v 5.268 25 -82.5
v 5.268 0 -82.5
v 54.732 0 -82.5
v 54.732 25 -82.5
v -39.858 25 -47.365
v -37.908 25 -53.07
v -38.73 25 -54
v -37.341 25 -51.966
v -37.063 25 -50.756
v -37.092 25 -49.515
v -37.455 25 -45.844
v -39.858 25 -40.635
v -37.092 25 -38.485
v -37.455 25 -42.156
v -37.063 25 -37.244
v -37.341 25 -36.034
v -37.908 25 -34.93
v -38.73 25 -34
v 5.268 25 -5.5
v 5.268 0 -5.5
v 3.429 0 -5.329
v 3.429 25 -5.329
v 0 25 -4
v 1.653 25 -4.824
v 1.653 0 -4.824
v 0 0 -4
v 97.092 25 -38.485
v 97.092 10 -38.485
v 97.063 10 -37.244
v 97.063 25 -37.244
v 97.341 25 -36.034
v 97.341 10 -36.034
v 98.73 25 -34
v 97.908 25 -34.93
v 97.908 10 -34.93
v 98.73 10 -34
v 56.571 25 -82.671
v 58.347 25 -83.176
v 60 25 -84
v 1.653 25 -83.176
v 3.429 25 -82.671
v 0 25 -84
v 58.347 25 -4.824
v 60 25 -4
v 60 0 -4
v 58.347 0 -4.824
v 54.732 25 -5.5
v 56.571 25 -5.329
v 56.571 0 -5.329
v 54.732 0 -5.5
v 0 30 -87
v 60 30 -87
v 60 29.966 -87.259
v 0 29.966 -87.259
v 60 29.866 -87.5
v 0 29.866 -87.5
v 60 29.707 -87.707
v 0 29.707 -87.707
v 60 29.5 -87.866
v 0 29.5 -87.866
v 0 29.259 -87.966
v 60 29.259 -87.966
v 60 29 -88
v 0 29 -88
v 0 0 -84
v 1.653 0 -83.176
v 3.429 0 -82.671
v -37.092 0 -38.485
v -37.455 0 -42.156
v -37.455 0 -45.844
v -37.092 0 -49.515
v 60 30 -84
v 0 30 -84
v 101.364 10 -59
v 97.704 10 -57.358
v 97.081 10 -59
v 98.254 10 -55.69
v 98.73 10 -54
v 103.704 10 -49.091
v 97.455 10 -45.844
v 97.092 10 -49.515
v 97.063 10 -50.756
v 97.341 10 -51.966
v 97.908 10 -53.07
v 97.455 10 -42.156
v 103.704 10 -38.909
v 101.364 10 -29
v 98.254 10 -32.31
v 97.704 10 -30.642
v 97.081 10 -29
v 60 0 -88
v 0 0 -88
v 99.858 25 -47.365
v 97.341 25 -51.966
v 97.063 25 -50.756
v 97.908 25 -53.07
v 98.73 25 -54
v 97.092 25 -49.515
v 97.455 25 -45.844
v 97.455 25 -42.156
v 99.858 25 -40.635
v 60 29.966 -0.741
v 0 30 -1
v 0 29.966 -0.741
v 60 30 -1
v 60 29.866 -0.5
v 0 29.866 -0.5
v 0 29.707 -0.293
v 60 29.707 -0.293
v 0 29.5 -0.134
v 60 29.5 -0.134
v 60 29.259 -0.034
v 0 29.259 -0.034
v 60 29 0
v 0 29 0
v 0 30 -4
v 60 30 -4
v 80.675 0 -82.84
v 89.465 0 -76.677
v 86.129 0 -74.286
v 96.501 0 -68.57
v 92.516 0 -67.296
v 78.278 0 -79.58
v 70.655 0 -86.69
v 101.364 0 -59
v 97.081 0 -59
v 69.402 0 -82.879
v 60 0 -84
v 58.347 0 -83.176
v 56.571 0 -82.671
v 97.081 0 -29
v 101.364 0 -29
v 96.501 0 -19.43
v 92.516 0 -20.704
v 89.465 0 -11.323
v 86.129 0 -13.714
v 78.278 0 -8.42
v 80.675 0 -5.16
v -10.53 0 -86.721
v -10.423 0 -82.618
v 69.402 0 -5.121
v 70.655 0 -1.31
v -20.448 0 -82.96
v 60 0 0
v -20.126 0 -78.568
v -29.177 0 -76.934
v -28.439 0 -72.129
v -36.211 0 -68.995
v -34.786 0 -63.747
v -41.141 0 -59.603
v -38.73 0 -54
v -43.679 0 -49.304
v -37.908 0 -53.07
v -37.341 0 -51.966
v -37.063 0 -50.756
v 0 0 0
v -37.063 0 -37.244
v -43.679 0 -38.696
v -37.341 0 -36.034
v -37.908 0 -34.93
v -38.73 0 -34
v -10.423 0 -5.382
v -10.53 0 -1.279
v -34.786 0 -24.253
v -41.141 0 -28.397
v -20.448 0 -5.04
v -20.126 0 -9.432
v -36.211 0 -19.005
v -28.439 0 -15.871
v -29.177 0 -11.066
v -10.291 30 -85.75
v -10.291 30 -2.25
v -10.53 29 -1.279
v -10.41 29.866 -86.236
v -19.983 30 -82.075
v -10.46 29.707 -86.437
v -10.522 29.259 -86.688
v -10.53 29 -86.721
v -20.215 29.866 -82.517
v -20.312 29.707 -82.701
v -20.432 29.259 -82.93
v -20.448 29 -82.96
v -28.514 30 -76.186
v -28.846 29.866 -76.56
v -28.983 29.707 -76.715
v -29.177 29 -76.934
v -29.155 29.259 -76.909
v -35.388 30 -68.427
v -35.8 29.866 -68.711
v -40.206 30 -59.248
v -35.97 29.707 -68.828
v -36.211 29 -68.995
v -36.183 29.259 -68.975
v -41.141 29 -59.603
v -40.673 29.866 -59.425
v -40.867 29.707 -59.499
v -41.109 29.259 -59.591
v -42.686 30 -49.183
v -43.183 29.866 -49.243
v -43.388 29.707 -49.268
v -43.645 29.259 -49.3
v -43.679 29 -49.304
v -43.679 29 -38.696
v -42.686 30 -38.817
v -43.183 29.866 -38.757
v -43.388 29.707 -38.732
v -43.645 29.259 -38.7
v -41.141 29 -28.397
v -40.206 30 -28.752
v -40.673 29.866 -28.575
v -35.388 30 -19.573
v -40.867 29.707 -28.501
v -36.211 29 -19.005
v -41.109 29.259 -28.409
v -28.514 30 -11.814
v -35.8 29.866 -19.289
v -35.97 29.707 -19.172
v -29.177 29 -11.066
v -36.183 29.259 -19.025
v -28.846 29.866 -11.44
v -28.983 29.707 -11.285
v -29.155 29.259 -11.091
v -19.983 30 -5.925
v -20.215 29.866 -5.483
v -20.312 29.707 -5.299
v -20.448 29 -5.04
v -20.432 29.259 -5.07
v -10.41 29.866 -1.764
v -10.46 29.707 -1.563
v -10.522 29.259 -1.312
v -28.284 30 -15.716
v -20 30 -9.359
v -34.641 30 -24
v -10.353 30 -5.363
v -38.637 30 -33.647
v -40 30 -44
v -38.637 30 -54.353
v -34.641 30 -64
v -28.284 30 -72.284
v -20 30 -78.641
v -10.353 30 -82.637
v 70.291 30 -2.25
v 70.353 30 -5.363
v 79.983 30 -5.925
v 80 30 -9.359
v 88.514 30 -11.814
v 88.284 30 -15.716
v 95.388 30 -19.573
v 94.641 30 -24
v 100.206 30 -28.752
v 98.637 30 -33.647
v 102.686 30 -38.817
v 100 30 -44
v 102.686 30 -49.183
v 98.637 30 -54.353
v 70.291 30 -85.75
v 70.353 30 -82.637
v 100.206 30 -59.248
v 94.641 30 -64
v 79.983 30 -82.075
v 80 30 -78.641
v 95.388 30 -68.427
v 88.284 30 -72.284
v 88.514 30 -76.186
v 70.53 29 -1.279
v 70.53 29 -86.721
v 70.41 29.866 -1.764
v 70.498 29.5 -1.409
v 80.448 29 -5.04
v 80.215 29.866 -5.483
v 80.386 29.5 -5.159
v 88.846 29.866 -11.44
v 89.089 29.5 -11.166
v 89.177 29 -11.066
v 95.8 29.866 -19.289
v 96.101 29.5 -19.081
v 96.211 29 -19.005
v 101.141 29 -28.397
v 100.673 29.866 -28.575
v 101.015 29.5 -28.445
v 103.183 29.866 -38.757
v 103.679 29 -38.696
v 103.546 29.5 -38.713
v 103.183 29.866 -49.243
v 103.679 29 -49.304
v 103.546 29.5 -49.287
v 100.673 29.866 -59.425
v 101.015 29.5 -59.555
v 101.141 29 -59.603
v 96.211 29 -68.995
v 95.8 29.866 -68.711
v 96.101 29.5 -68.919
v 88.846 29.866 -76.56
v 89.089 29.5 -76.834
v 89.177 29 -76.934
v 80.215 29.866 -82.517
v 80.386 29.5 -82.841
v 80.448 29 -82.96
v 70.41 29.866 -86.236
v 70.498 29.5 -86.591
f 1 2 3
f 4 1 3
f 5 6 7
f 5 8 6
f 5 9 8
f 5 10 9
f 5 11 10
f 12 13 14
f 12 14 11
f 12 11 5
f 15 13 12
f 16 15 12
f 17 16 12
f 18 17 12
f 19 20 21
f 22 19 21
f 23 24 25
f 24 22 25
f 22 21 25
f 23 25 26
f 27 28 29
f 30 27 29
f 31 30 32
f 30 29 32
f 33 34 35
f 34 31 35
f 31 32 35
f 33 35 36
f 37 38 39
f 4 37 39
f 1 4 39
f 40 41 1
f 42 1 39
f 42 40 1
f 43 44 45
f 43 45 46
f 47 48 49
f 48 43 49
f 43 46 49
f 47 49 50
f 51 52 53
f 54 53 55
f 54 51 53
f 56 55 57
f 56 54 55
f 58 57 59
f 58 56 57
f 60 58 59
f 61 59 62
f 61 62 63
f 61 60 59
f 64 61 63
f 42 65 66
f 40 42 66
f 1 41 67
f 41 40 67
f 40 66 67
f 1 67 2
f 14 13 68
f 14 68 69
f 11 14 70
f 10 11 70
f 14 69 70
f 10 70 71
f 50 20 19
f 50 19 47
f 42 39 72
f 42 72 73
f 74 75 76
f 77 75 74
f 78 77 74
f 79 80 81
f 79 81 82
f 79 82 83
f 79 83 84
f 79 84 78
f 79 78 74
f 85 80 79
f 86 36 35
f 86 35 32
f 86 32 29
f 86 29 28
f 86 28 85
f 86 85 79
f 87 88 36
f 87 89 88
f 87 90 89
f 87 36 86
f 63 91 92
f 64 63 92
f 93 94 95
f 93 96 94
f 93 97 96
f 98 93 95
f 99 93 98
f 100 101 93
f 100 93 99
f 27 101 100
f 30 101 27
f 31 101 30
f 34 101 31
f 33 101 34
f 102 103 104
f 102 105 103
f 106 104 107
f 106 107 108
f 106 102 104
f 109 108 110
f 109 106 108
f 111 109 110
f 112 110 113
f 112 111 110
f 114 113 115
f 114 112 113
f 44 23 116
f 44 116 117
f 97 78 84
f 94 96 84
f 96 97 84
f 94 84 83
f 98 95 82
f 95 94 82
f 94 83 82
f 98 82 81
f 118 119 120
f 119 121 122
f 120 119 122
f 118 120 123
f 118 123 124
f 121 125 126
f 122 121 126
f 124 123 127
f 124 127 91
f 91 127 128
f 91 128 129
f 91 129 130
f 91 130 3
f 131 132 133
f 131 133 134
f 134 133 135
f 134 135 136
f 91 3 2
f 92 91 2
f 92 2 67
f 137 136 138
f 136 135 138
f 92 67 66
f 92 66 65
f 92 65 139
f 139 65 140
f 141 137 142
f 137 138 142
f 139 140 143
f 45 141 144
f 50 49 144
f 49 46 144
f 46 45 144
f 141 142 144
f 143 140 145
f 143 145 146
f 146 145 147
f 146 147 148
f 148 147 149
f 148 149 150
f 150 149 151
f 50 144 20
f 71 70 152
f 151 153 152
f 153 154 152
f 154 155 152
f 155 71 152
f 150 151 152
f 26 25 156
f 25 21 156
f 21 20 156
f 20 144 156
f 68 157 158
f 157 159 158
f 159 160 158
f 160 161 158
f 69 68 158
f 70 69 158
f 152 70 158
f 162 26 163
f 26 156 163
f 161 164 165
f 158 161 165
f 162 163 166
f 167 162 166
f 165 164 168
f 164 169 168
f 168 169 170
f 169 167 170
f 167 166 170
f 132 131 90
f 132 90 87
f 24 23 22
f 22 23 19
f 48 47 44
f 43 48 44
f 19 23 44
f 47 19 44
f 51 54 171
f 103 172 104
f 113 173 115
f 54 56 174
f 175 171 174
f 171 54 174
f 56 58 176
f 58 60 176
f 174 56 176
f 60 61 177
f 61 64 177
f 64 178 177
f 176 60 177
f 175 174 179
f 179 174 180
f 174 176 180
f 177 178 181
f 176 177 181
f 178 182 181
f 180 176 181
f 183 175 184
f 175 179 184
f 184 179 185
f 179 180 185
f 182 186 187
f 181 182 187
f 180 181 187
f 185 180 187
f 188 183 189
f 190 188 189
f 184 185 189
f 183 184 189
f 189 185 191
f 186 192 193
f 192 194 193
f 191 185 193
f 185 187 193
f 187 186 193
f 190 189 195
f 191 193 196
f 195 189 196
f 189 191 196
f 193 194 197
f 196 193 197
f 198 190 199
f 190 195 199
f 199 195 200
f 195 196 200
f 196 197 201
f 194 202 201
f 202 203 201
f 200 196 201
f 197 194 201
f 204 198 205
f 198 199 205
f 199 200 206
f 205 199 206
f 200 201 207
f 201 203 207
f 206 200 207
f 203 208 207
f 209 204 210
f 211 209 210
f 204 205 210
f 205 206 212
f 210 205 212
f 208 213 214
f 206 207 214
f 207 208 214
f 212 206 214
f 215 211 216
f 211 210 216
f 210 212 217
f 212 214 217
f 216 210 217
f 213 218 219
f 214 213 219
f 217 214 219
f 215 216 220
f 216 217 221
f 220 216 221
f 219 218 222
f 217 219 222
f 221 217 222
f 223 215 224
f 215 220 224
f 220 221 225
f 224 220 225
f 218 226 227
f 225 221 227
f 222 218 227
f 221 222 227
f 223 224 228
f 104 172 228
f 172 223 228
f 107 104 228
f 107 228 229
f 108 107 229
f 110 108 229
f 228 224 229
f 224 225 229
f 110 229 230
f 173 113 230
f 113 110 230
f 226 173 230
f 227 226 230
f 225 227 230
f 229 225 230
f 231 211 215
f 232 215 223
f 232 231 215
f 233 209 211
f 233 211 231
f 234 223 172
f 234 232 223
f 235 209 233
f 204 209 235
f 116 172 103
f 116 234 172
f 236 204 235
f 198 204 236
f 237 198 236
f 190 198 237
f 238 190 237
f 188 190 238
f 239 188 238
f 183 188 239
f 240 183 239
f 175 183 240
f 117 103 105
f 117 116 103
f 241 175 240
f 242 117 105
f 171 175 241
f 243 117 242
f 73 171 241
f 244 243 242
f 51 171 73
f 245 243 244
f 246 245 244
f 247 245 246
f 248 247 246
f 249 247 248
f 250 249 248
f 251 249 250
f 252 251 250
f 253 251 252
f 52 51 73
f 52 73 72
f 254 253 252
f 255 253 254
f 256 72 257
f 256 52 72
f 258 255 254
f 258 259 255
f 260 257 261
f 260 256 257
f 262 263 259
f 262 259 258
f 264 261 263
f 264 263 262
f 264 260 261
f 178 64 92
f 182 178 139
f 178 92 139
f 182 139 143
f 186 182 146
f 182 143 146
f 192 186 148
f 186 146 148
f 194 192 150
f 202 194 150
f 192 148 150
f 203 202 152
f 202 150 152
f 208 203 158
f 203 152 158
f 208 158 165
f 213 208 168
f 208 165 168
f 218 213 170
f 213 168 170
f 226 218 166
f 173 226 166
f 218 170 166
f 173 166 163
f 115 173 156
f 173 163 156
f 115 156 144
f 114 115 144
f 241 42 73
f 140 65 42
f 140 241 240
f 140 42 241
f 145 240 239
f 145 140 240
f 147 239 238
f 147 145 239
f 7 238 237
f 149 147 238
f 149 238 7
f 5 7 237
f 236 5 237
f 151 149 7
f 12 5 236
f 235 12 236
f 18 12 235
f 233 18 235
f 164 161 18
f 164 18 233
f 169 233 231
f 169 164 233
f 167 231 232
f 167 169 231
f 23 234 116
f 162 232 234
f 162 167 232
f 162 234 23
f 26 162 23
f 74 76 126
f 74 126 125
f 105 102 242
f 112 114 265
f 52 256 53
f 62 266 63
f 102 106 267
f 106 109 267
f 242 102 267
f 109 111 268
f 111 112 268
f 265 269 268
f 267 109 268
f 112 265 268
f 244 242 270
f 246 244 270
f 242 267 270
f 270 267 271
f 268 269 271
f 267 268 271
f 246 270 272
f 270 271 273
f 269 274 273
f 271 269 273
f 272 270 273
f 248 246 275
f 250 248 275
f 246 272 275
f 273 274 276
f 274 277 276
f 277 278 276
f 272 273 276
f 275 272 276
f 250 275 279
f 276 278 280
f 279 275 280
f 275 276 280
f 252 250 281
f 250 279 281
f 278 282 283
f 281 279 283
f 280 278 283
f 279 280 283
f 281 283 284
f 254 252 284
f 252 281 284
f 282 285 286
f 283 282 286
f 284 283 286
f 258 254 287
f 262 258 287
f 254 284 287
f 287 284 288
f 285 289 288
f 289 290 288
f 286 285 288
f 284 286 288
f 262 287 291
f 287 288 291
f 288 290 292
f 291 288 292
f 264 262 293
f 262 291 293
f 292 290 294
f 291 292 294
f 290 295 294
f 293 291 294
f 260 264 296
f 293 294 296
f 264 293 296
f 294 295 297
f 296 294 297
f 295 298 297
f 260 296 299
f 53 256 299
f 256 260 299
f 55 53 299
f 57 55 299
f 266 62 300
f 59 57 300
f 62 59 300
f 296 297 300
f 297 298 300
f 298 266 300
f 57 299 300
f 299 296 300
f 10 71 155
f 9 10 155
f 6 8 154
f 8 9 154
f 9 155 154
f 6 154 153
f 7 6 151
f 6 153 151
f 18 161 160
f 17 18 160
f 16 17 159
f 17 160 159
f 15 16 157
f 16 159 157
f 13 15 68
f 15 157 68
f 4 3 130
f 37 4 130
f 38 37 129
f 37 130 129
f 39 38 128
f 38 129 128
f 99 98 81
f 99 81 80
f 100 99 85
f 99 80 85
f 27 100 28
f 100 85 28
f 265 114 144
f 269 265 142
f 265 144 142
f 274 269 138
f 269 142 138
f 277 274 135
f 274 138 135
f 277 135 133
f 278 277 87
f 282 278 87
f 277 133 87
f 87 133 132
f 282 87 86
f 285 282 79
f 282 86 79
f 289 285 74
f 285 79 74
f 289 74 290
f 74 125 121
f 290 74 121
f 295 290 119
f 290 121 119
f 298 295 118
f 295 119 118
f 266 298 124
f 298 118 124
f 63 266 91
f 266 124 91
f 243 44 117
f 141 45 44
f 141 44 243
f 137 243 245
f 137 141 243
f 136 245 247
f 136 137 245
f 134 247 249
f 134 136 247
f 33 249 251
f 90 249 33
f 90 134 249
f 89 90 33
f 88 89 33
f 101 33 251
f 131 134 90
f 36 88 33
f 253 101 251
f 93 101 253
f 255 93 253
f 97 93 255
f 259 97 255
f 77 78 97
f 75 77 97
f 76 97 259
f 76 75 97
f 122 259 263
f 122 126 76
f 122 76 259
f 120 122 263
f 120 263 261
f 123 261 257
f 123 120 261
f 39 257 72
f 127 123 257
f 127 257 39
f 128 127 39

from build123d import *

# Parameters (mm, degrees)
BOSS_EXTRUDE1_DEPTH = 30
SHELL1_T            = -4
SKETCH3_W           = 60
SKETCH3_H           = 1.5
BOSS_EXTRUDE2_DEPTH = 25
BOSS_EXTRUDE3_DEPTH = 25
FILLET2_R           = 10
BOSS_EXTRUDE5_DEPTH = 25
FILLET5_R           = 5
FILLET6_R           = 1
SKETCH9_W           = 17
SKETCH9_H           = 30
CUT_EXTRUDE1_DEPTH  = 10


with BuildPart() as part:
    # Sketch1 → Boss-Extrude1 (new body)
    with BuildSketch(Plane(origin=(0, 0, 0), x_dir=(1, 0, 0), z_dir=(0, 1, 0))):
        with BuildLine():
            Line((0, 0), (60, 0))
            ThreePointArc((60, 0), (104, 44), (60, 88))
            Line((60, 88), (0, 88))
            ThreePointArc((0, 88), (-44, 44), (0, 0))
        make_face()
    extrude(amount=BOSS_EXTRUDE1_DEPTH)

    # Shell1
    shell1_openings = [part.faces().sort_by_distance(p)[0] for p in [
        (30, 30, -44),
        (30, 0, -44),
    ]]
    offset(amount=SHELL1_T, openings=shell1_openings, kind=Kind.INTERSECTION)

    # Sketch3 → Boss-Extrude2 (add)
    with BuildSketch(Plane.XZ):
        with Locations((30, -4.75)):
            Rectangle(SKETCH3_W, SKETCH3_H)
    extrude(amount=-BOSS_EXTRUDE2_DEPTH)

    # Sketch5 → Boss-Extrude3 (add)
    with BuildSketch(Plane.XZ):
        Polygon((0, -84), (0, -82.5), (60.003782522, -82.5), (60, -84), align=None)
    extrude(amount=-BOSS_EXTRUDE3_DEPTH)

    # Fillet2
    # the kernel refuses this fillet: 10 mm, written as the material it takes off along each edge
    with BuildSketch(Plane(origin=(60, -13.169567191, -5.5), x_dir=(0, 0, 1), z_dir=(0, 1, 0)), Plane(origin=(0, -13.169567191, -82.5), x_dir=(0, 0, -1), z_dir=(0, 1, 0))) as fillet2_piece_1:
        with BuildLine():
            CenterArc((10, -5.267826876), FILLET2_R, 148.211669383, 31.788330617)
            Line((0, -5.267826876), (-0.2, -5.267826876))
            Line((-0.2, -5.267826876), (-0.2, 0))
            Line((-0.2, 0), (0, 0.2))
            ThreePointArc((0, 0.2), (0.75, 0.2), (1.33, 0.105356538))
            Line((1.33, 0.105356538), (1.5, 0))
        make_face()
    extrude(amount=51.339134382, mode=Mode.SUBTRACT)
    with BuildSketch(Plane(origin=(60.003782522, -13.179023495, -82.5), x_dir=(-1, 0, 0), z_dir=(0, 1, 0))) as fillet2_piece_2:
        with BuildLine():
            CenterArc((5.271609398, -10), FILLET2_R, 90, 31.788330617)
            Line((0.003782522, -1.5), (-0.101574016, -1.33))
            ThreePointArc((-0.101574016, -1.33), (-0.198108103, -0.750504335), (-0.199999364, -0.000504335))
            Line((-0.199999364, -0.000504335), (0, 0.2))
            Line((0, 0.2), (5.271609398, 0.2))
            Line((5.271609398, 0.2), (5.271609398, 0))
        make_face()
    extrude(amount=51.358046991, mode=Mode.SUBTRACT)
    with BuildSketch(Plane(origin=(0, -13.169567191, -5.5), x_dir=(1, 0, 0), z_dir=(0, 1, 0))) as fillet2_piece_3:
        with BuildLine():
            CenterArc((5.267826876, -10), FILLET2_R, 90, 31.788330617)
            Line((0, -1.5), (-0.105356538, -1.33))
            ThreePointArc((-0.105356538, -1.33), (-0.2, -0.75), (-0.2, 0))
            Line((-0.2, 0), (0, 0.2))
            Line((0, 0.2), (5.267826876, 0.2))
            Line((5.267826876, 0.2), (5.267826876, 0))
        make_face()
    extrude(amount=51.339134382, mode=Mode.SUBTRACT)

    # Sketch8 → Boss-Extrude5 (add)
    with BuildSketch(Plane.XZ):
        with BuildLine():
            Line((96.142080737, -34), (98.729833462, -34))
            ThreePointArc((98.729833462, -34), (100, -44), (98.729833462, -54))
            Line((98.729833462, -54), (96.142080737, -54))
            ThreePointArc((96.142080737, -54), (97.5, -44), (96.142080737, -34))
        make_face()
        with BuildLine():
            Line((-36.142080737, -54), (-38.729833462, -54))
            ThreePointArc((-38.729833462, -54), (-40, -44), (-38.729833462, -34))
            Line((-38.729833462, -34), (-36.142080737, -34))
            ThreePointArc((-36.142080737, -34), (-37.5, -44), (-36.142080737, -54))
        make_face()
    extrude(amount=-BOSS_EXTRUDE5_DEPTH)

    # Fillet5
    # the kernel refuses this fillet: 5 mm, written as the material it takes off along each edge
    with BuildSketch(Plane(origin=(96.142080737, -11.460527233, -34), x_dir=(1, 0, 0), z_dir=(0, 1, 0)), Plane(origin=(-36.142080737, -11.460527233, -54), x_dir=(-1, 0, 0), z_dir=(0, 1, 0))) as fillet5_piece_1:
        with BuildLine():
            CenterArc((5.895743435, 3.749292929), FILLET5_R, 171.542516957, 57.035612676)
            Line((0.950117062, 4.484670231), (0.851204534, 4.499377777))
            ThreePointArc((0.851204534, 4.499377777), (0.445822951, 2.248528932), (-0.096378882, 0.026666667))
            Line((-0.096378882, 0.026666667), (0, -0.1))
            ThreePointArc((0, -0.1), (1.293876363, -0.1), (2.521592911, -0.074985859))
            Line((2.521592911, -0.074985859), (2.587752725, 0))
        make_face()
    extrude(amount=47.921054465, mode=Mode.SUBTRACT)
    with BuildSketch(Plane(origin=(96.142080737, -11.460527233, -54), x_dir=(1, 0, 0), z_dir=(0, 1, 0)), Plane(origin=(-36.142080737, -11.460527233, -34), x_dir=(-1, 0, 0), z_dir=(0, 1, 0))) as fillet5_piece_2:
        with BuildLine():
            CenterArc((5.895743435, -3.749292929), FILLET5_R, 131.421870366, 57.035612676)
            Line((0.950117062, -4.484670231), (0.851204534, -4.499377777))
            ThreePointArc((0.851204534, -4.499377777), (0.445822951, -2.248528932), (-0.096378882, -0.026666667))
            Line((-0.096378882, -0.026666667), (0, 0.1))
            ThreePointArc((0, 0.1), (1.293876363, 0.1), (2.521592911, 0.074985859))
            Line((2.521592911, 0.074985859), (2.587752725, 0))
        make_face()
    extrude(amount=47.921054465, mode=Mode.SUBTRACT)

    # Fillet6
    fillet6_edges = [part.edges().sort_by_distance(p)[0] for p in [
        (104, 30, -44),
        (30, 30, -88),
        (-44, 30, -44),
        (30, 30, 0),
    ]]
    fillet(fillet6_edges, radius=FILLET6_R)

    # Sketch9 → Cut-Extrude1 (cut)
    with BuildSketch(Plane.XZ):
        with Locations((102.218118592, -44)):
            Rectangle(SKETCH9_W, SKETCH9_H)
    extrude(amount=-CUT_EXTRUDE1_DEPTH, mode=Mode.SUBTRACT)


solid = part.part
